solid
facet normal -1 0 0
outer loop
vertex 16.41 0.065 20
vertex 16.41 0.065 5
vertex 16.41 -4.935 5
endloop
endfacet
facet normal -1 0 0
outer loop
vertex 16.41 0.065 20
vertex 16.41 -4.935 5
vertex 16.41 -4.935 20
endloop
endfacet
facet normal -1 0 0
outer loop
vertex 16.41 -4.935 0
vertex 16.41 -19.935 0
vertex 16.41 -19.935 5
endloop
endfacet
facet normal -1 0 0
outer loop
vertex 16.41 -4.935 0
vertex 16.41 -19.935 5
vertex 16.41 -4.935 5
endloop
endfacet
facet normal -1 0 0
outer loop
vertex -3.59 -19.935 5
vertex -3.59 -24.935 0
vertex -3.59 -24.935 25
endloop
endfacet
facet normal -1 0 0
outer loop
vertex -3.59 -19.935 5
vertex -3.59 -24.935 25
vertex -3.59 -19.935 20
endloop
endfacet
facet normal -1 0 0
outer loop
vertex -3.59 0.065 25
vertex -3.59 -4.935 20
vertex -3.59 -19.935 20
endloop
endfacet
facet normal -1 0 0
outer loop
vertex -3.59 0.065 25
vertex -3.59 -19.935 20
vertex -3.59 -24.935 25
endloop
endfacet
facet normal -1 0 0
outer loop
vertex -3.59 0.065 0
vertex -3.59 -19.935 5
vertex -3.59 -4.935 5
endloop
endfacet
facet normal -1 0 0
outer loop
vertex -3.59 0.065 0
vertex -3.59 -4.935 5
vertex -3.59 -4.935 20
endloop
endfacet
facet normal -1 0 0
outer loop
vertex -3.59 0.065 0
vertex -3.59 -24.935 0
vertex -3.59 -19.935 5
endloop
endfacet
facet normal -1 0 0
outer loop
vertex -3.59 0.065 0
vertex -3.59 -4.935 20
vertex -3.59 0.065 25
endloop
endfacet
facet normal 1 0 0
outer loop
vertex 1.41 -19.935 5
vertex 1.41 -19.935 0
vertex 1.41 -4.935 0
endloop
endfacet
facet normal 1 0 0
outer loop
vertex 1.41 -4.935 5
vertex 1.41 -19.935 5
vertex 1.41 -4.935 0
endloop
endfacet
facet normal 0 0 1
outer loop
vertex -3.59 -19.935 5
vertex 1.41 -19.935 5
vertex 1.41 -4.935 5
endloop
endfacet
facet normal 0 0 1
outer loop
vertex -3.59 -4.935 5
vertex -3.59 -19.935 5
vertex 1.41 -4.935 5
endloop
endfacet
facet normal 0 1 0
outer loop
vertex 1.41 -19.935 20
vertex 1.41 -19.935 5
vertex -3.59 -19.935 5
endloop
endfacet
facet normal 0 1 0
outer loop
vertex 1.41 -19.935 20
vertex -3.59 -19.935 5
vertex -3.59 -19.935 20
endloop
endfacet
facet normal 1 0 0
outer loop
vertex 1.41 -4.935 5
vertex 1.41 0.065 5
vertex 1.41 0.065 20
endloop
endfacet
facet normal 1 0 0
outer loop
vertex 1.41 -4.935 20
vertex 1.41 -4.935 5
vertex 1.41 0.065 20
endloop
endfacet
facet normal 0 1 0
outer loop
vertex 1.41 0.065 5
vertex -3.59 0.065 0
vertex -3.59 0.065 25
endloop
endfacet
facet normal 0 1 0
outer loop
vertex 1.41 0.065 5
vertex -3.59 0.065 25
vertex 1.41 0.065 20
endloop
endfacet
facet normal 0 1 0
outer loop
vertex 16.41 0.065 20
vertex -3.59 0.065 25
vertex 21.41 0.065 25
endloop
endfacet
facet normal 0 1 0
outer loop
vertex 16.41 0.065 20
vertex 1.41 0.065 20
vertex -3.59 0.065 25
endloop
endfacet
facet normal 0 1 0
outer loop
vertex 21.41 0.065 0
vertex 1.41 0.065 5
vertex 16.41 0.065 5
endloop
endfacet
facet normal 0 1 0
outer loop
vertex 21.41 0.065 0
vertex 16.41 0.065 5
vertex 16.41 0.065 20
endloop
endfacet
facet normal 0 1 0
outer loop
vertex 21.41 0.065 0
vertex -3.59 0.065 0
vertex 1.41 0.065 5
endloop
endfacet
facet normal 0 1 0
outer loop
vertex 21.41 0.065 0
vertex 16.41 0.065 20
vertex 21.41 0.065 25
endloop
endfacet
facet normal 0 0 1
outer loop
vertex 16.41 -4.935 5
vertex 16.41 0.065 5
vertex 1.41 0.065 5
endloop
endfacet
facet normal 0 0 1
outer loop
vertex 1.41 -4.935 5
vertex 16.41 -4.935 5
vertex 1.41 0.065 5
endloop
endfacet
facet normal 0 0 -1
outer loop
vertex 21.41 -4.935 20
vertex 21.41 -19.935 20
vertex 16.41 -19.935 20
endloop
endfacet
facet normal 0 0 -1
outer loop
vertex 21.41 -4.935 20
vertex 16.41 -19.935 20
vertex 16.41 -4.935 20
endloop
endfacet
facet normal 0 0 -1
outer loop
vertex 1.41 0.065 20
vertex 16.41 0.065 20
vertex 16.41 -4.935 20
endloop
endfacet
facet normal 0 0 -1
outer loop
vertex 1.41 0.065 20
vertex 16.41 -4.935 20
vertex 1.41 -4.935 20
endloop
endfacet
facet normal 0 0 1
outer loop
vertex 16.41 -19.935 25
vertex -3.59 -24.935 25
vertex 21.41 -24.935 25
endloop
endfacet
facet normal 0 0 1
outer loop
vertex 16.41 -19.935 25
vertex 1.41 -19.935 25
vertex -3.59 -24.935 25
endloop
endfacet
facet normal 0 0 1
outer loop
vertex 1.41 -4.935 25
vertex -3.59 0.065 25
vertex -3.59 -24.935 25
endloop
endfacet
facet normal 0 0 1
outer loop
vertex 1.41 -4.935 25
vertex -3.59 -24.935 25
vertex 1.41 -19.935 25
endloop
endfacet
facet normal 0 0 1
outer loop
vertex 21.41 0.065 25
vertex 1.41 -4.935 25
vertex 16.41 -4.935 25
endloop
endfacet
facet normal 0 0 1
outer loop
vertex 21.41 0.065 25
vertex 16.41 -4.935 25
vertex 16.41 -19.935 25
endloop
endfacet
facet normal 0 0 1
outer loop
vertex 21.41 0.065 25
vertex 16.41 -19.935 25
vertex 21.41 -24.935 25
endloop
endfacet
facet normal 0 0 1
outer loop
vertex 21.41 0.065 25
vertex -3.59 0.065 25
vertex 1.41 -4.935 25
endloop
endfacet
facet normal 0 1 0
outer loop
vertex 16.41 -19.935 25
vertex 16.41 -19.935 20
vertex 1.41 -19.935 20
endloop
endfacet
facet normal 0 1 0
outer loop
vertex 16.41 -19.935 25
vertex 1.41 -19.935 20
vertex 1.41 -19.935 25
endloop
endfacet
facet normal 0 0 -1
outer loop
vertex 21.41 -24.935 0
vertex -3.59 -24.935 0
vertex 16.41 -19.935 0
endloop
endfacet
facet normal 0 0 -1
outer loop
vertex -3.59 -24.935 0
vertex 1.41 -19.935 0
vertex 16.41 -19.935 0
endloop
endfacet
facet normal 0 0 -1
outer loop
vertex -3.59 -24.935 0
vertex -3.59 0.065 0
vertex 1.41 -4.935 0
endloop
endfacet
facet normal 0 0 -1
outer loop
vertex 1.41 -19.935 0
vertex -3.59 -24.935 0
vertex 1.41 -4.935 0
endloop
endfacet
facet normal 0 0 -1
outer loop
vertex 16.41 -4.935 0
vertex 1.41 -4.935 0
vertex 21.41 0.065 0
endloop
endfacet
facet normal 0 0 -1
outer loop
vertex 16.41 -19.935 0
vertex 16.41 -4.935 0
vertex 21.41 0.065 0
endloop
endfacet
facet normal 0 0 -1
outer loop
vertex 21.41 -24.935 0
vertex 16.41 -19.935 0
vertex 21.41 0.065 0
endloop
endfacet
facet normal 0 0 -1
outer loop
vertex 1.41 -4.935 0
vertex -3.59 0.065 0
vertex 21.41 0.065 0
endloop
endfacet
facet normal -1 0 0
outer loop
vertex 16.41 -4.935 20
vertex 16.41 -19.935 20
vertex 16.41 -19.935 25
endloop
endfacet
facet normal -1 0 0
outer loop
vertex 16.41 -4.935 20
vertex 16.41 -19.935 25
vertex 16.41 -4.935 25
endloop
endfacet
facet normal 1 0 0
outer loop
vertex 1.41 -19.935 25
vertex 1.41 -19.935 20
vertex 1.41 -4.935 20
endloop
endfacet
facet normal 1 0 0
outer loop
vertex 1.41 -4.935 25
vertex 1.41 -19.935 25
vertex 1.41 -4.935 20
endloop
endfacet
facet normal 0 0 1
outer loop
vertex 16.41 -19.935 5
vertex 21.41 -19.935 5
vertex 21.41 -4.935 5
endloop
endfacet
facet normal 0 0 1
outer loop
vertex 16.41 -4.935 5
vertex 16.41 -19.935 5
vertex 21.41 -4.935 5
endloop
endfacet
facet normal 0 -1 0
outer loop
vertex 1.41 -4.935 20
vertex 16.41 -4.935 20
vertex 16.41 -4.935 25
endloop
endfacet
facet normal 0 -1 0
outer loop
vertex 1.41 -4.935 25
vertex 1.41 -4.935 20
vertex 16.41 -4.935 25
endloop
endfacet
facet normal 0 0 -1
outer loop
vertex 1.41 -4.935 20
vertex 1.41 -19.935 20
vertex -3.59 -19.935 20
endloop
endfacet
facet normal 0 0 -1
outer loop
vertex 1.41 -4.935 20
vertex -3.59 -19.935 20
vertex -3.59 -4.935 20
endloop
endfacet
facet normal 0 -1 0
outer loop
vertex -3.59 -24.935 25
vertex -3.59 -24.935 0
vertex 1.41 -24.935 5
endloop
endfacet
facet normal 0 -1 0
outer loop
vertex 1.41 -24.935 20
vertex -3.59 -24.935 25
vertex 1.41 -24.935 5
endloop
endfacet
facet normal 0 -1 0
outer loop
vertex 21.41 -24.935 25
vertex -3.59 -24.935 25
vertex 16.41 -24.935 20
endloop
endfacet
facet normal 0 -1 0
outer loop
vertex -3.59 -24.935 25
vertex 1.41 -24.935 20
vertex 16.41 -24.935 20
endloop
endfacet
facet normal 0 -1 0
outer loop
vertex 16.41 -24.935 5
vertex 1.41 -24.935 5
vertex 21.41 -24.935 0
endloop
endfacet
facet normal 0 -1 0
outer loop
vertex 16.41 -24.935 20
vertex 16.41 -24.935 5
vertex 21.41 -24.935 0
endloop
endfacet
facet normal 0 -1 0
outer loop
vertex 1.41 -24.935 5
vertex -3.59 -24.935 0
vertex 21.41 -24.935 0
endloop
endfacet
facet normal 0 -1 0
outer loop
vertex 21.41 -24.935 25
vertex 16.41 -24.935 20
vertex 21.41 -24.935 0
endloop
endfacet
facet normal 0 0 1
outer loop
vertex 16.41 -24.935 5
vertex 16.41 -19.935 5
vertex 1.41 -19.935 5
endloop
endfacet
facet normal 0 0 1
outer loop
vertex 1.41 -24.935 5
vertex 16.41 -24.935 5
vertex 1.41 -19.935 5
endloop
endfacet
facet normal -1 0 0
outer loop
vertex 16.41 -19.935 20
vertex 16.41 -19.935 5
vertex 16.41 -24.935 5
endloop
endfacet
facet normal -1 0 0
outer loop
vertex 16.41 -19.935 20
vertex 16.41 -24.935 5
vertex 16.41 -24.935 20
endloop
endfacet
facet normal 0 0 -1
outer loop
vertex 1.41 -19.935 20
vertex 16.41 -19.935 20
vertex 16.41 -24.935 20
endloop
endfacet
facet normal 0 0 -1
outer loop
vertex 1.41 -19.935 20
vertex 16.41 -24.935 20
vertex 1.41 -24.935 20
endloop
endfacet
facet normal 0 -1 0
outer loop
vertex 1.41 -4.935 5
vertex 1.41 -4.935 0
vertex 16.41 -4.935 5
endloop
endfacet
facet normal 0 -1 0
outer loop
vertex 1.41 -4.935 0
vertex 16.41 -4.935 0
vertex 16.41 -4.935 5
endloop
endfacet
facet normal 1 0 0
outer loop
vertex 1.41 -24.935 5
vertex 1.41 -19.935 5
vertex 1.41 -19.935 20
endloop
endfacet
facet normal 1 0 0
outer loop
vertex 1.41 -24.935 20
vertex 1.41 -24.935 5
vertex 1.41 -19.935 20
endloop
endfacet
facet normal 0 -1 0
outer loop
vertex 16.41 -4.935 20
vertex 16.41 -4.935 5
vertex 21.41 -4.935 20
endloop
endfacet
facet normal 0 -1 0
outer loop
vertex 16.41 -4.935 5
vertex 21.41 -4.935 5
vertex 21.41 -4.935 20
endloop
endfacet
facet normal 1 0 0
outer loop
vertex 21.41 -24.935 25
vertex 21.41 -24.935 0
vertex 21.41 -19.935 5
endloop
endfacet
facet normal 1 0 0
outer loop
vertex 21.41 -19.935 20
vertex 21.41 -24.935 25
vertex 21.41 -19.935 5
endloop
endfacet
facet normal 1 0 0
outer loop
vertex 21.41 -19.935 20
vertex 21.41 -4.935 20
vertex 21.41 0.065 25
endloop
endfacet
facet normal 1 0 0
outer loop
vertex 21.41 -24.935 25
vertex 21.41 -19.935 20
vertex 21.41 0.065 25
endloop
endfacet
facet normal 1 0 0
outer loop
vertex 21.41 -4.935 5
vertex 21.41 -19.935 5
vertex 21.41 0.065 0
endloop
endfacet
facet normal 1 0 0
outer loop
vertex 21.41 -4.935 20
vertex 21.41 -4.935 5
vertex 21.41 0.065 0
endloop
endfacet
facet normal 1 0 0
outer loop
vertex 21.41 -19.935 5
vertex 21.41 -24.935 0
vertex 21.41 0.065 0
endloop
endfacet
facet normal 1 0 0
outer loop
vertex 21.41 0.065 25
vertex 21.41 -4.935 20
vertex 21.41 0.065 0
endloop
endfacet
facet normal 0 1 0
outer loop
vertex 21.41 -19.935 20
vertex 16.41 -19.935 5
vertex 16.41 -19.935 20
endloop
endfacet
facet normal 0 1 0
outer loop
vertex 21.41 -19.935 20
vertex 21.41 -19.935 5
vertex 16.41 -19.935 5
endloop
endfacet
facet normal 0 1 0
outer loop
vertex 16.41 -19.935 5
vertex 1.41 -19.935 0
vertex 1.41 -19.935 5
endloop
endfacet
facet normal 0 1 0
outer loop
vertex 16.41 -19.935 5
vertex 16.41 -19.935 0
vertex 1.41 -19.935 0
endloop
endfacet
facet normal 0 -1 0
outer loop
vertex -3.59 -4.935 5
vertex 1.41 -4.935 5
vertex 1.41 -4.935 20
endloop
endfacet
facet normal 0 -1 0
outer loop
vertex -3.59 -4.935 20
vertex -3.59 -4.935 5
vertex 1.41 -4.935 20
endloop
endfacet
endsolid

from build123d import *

# Parameters (mm, degrees)
F0_W     = 25
F0_H     = 25
F0_W_2   = 15
F0_H_2   = 15
F1_DEPTH = 25
F2_W     = 15
F2_H     = 15
F3_DEPTH = 25
F4_W     = 15
F4_H     = 15
F5_DEPTH = 25


with BuildPart() as f1:
    # F0 (on Top) → F1 (new body)
    with BuildSketch(Plane.XY):
        with Locations((8.910105, -12.434757)):
            Rectangle(F0_W, F0_H)
        with Locations((8.910105, -12.434757)):
            Rectangle(F0_W_2, F0_H_2, mode=Mode.SUBTRACT)
    extrude(amount=F1_DEPTH)

    # F2 (on face) → F3 (cut)
    with BuildSketch(Plane.YZ.offset(21.410105)):
        with Locations((-12.434757, 12.5)):
            Rectangle(F2_W, F2_H)
    extrude(amount=-F3_DEPTH, mode=Mode.SUBTRACT)

    # F4 (on face) → F5 (cut)
    with BuildSketch(Plane(origin=(0, 0.065243, 0), x_dir=(-1, 0, 0), z_dir=(0, 1, 0))):
        with Locations((-8.910105, 12.5)):
            Rectangle(F4_W, F4_H)
    extrude(amount=-F5_DEPTH, mode=Mode.SUBTRACT)


solid = f1.part
